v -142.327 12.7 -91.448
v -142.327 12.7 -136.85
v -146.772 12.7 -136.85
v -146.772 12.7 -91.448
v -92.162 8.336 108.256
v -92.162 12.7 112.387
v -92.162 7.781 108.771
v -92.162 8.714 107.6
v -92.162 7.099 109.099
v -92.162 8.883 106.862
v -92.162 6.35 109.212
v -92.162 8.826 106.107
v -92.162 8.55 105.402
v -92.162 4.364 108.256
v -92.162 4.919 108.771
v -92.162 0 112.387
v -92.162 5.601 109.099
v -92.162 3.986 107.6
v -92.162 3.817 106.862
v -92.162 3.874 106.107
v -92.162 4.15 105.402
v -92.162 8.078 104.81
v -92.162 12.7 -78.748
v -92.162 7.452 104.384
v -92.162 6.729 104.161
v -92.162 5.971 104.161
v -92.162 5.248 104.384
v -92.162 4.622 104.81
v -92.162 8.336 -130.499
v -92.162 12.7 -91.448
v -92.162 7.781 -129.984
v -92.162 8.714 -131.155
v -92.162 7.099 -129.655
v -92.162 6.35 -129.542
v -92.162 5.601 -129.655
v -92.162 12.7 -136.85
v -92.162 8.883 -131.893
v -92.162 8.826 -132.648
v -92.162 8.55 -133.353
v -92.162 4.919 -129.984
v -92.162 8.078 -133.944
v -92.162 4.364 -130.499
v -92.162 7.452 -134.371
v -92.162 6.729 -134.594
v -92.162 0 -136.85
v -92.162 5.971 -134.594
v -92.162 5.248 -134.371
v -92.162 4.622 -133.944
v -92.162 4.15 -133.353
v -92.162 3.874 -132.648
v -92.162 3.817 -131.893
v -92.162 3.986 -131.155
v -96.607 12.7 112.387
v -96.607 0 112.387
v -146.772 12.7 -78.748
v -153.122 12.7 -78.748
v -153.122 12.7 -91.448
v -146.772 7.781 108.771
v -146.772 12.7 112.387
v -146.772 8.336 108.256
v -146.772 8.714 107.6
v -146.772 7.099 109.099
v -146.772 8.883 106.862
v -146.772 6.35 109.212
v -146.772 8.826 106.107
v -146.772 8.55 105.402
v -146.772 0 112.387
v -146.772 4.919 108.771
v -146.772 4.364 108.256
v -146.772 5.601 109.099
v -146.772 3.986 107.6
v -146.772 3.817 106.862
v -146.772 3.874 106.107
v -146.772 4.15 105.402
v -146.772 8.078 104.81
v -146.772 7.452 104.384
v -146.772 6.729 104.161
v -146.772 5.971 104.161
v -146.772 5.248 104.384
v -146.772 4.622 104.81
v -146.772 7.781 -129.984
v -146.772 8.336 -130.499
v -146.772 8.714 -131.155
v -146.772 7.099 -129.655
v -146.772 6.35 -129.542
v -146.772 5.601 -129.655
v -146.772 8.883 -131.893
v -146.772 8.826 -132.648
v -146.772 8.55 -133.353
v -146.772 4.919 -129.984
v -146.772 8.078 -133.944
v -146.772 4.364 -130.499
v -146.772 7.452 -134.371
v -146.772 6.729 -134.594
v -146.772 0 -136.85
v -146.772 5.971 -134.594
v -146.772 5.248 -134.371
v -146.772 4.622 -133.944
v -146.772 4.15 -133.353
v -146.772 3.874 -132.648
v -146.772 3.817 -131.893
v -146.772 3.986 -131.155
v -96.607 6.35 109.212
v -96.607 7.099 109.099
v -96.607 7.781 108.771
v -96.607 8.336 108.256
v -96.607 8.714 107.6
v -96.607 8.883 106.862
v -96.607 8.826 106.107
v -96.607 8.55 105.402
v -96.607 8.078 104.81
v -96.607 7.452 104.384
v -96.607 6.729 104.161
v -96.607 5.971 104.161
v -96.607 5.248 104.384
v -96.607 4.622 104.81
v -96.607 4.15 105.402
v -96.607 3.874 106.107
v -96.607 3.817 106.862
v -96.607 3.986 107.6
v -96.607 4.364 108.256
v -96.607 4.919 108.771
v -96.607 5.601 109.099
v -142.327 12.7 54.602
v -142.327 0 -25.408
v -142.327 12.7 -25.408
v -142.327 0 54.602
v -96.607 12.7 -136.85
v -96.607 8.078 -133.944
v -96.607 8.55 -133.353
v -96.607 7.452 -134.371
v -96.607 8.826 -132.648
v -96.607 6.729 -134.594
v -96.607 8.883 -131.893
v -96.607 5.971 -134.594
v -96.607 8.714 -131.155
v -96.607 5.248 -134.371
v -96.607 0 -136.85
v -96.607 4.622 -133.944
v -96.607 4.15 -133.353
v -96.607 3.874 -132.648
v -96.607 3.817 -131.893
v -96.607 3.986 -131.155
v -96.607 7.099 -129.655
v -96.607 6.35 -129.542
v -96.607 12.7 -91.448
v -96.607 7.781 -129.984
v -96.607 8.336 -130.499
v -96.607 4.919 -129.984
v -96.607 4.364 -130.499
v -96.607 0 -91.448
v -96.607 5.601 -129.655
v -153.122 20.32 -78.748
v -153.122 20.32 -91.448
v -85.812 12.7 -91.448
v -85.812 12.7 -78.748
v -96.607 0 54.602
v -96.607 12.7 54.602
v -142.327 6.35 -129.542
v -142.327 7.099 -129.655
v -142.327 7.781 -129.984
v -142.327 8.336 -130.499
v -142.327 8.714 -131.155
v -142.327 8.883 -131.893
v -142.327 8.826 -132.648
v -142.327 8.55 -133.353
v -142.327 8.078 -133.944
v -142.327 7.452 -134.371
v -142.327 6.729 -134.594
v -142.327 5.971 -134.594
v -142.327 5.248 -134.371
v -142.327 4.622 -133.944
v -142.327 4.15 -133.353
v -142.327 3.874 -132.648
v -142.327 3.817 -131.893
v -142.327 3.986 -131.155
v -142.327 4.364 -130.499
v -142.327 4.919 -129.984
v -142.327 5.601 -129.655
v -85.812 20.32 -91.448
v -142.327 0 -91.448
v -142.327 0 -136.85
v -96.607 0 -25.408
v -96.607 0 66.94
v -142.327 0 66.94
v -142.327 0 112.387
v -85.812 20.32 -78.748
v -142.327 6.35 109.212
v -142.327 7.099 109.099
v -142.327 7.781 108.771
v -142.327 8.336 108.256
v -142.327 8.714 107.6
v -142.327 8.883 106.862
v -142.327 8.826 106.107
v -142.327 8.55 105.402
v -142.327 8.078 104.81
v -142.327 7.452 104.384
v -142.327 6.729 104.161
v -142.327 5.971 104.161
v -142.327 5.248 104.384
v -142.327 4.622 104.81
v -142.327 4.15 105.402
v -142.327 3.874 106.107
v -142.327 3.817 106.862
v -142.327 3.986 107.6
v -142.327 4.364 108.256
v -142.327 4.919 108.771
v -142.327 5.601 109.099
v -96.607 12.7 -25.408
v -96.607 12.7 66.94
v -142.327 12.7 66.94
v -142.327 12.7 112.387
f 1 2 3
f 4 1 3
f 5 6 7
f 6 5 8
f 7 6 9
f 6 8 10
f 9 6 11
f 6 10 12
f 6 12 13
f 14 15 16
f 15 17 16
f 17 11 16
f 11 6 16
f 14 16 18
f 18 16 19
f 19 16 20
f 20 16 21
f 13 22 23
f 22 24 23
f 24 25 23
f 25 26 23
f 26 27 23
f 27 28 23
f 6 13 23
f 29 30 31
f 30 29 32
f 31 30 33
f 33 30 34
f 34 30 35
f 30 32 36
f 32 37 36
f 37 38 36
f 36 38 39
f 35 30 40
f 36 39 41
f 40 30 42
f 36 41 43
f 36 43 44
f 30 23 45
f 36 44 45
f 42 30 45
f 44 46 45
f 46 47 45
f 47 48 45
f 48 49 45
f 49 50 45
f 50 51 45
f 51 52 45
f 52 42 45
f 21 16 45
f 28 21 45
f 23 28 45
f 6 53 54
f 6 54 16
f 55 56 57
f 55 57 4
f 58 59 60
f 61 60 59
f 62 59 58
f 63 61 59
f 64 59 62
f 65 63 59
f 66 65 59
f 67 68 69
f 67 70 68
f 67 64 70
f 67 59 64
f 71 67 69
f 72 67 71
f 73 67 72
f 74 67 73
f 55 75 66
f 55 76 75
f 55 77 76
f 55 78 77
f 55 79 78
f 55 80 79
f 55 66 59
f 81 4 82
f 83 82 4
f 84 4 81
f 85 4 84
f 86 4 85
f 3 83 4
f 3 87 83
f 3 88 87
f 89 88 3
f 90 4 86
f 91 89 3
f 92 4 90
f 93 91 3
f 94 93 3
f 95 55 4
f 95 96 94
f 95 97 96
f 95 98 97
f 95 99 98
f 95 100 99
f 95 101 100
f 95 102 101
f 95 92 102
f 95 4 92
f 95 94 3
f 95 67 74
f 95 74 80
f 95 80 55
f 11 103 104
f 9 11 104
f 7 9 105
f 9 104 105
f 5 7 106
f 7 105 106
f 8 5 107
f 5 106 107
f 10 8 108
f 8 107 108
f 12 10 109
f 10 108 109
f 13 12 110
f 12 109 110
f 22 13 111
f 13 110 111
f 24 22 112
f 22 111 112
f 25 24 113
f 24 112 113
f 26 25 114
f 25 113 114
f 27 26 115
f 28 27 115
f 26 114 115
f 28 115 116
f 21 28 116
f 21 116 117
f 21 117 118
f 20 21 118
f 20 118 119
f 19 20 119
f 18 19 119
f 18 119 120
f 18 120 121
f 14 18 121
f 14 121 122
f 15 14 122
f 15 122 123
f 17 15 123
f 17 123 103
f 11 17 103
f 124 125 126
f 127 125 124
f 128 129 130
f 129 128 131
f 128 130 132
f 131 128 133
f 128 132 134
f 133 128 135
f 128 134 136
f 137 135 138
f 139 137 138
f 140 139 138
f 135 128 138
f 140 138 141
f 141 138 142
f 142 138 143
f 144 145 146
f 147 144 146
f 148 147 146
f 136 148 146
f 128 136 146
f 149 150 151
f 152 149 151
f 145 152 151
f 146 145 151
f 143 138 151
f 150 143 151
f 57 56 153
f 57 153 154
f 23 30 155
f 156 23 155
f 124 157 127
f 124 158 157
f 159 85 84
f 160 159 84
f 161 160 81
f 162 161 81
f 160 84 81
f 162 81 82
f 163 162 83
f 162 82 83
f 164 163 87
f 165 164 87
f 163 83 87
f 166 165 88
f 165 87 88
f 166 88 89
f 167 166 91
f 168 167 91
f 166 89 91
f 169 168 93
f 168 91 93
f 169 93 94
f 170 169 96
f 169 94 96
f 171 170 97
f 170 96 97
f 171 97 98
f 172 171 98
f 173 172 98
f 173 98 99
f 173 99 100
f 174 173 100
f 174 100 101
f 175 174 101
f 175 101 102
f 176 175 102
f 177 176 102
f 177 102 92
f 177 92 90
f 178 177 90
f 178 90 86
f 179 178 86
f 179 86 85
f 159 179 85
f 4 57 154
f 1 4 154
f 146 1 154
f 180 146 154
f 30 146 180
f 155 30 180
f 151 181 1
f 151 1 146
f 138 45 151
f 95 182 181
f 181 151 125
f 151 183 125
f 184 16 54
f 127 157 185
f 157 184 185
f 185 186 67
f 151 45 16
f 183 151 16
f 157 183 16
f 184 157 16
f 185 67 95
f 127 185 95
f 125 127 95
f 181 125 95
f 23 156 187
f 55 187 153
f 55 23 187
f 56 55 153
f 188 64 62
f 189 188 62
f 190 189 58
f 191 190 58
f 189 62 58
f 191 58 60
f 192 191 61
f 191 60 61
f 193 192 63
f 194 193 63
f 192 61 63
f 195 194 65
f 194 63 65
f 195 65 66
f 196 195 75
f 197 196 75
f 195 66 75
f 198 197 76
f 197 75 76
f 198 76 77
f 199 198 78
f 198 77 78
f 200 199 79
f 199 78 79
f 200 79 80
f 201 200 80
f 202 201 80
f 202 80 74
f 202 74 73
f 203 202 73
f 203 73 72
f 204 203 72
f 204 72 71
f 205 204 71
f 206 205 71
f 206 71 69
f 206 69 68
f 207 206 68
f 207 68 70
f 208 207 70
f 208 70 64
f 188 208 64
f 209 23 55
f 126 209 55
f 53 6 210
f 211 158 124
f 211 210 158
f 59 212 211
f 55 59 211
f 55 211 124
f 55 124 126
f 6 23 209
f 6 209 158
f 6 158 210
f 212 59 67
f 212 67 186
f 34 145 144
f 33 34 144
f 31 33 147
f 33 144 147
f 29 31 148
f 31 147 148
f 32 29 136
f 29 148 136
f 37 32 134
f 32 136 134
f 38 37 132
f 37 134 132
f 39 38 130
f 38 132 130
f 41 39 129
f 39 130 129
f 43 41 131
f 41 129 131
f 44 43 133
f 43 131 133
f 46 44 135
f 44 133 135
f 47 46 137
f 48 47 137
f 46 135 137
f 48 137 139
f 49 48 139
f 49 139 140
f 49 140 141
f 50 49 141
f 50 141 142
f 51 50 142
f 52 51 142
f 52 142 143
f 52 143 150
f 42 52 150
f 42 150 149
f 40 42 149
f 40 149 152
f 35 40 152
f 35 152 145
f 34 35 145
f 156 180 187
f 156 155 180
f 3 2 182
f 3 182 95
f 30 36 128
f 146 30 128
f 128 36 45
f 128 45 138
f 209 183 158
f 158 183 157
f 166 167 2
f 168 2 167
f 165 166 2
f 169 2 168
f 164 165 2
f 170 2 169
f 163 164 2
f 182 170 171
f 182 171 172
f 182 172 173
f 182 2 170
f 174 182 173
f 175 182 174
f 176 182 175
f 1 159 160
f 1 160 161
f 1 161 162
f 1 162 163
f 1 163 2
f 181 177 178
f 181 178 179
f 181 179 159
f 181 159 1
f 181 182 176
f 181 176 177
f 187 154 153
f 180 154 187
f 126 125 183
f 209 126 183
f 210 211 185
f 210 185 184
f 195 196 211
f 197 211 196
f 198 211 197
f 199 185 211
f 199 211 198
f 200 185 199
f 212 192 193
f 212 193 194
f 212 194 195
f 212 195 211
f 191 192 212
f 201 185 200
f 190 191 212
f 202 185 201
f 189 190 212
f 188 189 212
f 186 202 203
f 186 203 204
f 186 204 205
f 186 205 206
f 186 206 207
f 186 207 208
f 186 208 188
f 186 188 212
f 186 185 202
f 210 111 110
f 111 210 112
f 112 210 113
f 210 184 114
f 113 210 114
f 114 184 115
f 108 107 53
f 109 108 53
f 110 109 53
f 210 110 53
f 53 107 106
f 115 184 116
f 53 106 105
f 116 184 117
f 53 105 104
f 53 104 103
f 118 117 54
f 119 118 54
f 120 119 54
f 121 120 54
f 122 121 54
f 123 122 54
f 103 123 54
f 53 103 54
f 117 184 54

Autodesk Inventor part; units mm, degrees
ref_plane "YZ Plane" through (0, 0, 0) normal (1, 0, 0) x (0, 1, 0)
ref_plane "XZ Plane" through (0, 0, 0) normal (0, 1, 0) x (-1, 0, 0)
ref_plane "XY Plane" through (0, 0, 0) normal (0, 0, 1) x (1, 0, 0)
sketch "Sketch1" plane through (0, 0, 0) normal (0, 1, 0) x (-1, 0, 0)
  line L0 (146.7721, -144.7877) -> (142.3271, -144.7877)
  line L1 (142.3271, -144.7877) -> (142.3271, 134.6123)
  line L2 (142.3271, 134.6123) -> (146.7721, 134.6123)
  line L3 (146.7721, 134.6123) -> (146.7721, -144.7877)
  line L4 (96.6071, -144.7877) -> (96.6071, 134.6123)
  line L5 (96.6071, 134.6123) -> (92.1621, 134.6123)
  line L6 (92.1621, 134.6123) -> (92.1621, -144.7877)
  line L7 (92.1621, -144.7877) -> (96.6071, -144.7877)
  line L8 (142.3271, -91.4477) -> (96.6071, -91.4477)
  line L9 (142.3271, -25.4077) -> (96.6071, -25.4077)
  point P0 (0, 0)
  dimension "d0" = 4.445
  dimension "d1" = 279.4
  dimension "d2" = 4.445
  dimension "d3" = 45.72
  dimension "d4" = 66.04
  dimension "d5" = 53.34
extrude "Extrusion1" add sketch "Sketch1" along normal blind 12.7
sketch "Sketch2" plane through (0, 12.7, 0) normal (0, 1, 0) x (1, 0, 0)
  line L0 (-142.3271, 91.4477) -> (-142.3271, 144.7877) projected
  line L1 (-142.3271, 91.4477) -> (-146.7721, 91.4477)
  line L2 (-146.7721, 144.7877) -> (-146.7721, -134.6123) projected
  line L3 (-153.1221, 91.4477) -> (-146.7721, 91.4477)
  line L4 (-96.6071, 91.4477) -> (-142.3271, 91.4477) projected
  line L5 (-96.6071, 91.4477) -> (-92.1621, 91.4477)
  line L6 (-92.1621, -134.6123) -> (-92.1621, 144.7877) projected
  line L7 (-92.1621, 91.4477) -> (-85.8121, 91.4477)
  line L8 (-85.8121, 91.4477) -> (-85.8121, 78.7477)
  line L9 (-85.8121, 78.7477) -> (-153.1221, 78.7477)
  line L10 (-153.1221, 78.7477) -> (-153.1221, 91.4477)
  point P0 (0, 0)
  dimension "d8" = 6.35
  dimension "d9" = 6.35
  dimension "d10" = 12.7
extrude "Extrusion2" add sketch "Sketch2" along normal blind 7.62
sketch "Sketch3" plane through (-146.7721, 0, -144.7877) normal (-1, 0, 0) x (0, 0, 1)
  line L0 (279.4, 0) -> (279.4, 12.7) projected
  circle A0 centre (251.46, 6.35) radius 2.54
  point P0 (144.7877, 0)
  dimension "d15" = 5.08
extrude "Extrusion3" cut sketch "Sketch3" against normal blind 25400
sketch "Sketch4" plane through (-146.7721, 0, -144.7877) normal (-1, 0, 0) x (0, 0, 1)
  line L0 (0, 0) -> (0, 12.7) projected
  circle A0 centre (12.7052, 6.35) radius 2.54
  point P0 (144.7877, 0)
  dimension "d19" = 5.08
extrude "Extrusion4" cut sketch "Sketch4" against normal blind 25400
sketch "Sketch5" plane through (0, 12.7, 0) normal (0, 1, 0) x (1, 0, 0)
  line L0 (-146.7721, 144.7877) -> (-146.7721, -134.6123) projected
  line L1 (-142.3271, -134.6123) -> (-142.3271, 25.4077) projected
  line L2 (-142.3271, -66.9401) -> (-96.6071, -66.9401)
  line L3 (-96.6071, 25.4077) -> (-96.6071, -134.6123) projected
  line L4 (-96.6071, -54.6023) -> (-142.3271, -54.6023)
  line L5 (-142.3271, -54.6023) -> (-142.3271, -66.9401)
  point P0 (0, 0)
extrude "Extrusion5" add sketch "Sketch5" against normal blind 12.7
sketch "Sketch6" plane through (-146.7721, 0, 134.6123) normal (0, 0, 1) x (1, 0, 0)
  line L0 (0, 12.7) -> (4.445, 12.7) projected
  line L1 (4.445, 0) -> (4.445, 12.7) projected
  line L2 (0, 12.7) -> (4.445, 12.7)
  line L3 (4.445, 12.7) -> (4.445, 0)
  line L4 (4.445, 0) -> (0, 0)
  line L5 (0, 0) -> (0, 12.7)
  line L6 (50.165, 0) -> (50.165, 12.7) projected
  line L7 (54.61, 0) -> (54.61, 12.7) projected
  line L8 (50.165, 12.7) -> (54.61, 12.7)
  line L9 (54.61, 12.7) -> (54.61, 0)
  line L10 (54.61, 0) -> (50.165, 0)
  line L11 (50.165, 0) -> (50.165, 12.7)
  point P0 (146.7721, 0)
extrude "Extrusion6" cut sketch "Sketch6" against normal blind 22.225
sketch "Sketch7" plane through (-92.1621, 0, -144.7877) normal (0, 0, -1) x (-1, 0, 0)
  line L0 (50.165, 0) -> (50.165, 12.7) projected
  line L1 (54.61, 12.7) -> (50.165, 12.7)
  line L2 (50.165, 12.7) -> (50.165, 0)
  line L3 (50.165, 0) -> (54.61, 0)
  line L4 (54.61, 0) -> (54.61, 12.7)
  line L5 (4.445, 0) -> (4.445, 12.7) projected
  line L6 (0, 0) -> (4.445, 0) projected
  line L7 (4.445, 12.7) -> (0, 12.7)
  line L8 (0, 12.7) -> (0, 0)
  line L9 (0, 0) -> (4.445, 0)
  line L10 (4.445, 0) -> (4.445, 12.7)
  point P0 (-92.1621, 0)
extrude "Extrusion7" cut sketch "Sketch7" against normal blind 7.9375
properties part number "Mousetrap Car"
